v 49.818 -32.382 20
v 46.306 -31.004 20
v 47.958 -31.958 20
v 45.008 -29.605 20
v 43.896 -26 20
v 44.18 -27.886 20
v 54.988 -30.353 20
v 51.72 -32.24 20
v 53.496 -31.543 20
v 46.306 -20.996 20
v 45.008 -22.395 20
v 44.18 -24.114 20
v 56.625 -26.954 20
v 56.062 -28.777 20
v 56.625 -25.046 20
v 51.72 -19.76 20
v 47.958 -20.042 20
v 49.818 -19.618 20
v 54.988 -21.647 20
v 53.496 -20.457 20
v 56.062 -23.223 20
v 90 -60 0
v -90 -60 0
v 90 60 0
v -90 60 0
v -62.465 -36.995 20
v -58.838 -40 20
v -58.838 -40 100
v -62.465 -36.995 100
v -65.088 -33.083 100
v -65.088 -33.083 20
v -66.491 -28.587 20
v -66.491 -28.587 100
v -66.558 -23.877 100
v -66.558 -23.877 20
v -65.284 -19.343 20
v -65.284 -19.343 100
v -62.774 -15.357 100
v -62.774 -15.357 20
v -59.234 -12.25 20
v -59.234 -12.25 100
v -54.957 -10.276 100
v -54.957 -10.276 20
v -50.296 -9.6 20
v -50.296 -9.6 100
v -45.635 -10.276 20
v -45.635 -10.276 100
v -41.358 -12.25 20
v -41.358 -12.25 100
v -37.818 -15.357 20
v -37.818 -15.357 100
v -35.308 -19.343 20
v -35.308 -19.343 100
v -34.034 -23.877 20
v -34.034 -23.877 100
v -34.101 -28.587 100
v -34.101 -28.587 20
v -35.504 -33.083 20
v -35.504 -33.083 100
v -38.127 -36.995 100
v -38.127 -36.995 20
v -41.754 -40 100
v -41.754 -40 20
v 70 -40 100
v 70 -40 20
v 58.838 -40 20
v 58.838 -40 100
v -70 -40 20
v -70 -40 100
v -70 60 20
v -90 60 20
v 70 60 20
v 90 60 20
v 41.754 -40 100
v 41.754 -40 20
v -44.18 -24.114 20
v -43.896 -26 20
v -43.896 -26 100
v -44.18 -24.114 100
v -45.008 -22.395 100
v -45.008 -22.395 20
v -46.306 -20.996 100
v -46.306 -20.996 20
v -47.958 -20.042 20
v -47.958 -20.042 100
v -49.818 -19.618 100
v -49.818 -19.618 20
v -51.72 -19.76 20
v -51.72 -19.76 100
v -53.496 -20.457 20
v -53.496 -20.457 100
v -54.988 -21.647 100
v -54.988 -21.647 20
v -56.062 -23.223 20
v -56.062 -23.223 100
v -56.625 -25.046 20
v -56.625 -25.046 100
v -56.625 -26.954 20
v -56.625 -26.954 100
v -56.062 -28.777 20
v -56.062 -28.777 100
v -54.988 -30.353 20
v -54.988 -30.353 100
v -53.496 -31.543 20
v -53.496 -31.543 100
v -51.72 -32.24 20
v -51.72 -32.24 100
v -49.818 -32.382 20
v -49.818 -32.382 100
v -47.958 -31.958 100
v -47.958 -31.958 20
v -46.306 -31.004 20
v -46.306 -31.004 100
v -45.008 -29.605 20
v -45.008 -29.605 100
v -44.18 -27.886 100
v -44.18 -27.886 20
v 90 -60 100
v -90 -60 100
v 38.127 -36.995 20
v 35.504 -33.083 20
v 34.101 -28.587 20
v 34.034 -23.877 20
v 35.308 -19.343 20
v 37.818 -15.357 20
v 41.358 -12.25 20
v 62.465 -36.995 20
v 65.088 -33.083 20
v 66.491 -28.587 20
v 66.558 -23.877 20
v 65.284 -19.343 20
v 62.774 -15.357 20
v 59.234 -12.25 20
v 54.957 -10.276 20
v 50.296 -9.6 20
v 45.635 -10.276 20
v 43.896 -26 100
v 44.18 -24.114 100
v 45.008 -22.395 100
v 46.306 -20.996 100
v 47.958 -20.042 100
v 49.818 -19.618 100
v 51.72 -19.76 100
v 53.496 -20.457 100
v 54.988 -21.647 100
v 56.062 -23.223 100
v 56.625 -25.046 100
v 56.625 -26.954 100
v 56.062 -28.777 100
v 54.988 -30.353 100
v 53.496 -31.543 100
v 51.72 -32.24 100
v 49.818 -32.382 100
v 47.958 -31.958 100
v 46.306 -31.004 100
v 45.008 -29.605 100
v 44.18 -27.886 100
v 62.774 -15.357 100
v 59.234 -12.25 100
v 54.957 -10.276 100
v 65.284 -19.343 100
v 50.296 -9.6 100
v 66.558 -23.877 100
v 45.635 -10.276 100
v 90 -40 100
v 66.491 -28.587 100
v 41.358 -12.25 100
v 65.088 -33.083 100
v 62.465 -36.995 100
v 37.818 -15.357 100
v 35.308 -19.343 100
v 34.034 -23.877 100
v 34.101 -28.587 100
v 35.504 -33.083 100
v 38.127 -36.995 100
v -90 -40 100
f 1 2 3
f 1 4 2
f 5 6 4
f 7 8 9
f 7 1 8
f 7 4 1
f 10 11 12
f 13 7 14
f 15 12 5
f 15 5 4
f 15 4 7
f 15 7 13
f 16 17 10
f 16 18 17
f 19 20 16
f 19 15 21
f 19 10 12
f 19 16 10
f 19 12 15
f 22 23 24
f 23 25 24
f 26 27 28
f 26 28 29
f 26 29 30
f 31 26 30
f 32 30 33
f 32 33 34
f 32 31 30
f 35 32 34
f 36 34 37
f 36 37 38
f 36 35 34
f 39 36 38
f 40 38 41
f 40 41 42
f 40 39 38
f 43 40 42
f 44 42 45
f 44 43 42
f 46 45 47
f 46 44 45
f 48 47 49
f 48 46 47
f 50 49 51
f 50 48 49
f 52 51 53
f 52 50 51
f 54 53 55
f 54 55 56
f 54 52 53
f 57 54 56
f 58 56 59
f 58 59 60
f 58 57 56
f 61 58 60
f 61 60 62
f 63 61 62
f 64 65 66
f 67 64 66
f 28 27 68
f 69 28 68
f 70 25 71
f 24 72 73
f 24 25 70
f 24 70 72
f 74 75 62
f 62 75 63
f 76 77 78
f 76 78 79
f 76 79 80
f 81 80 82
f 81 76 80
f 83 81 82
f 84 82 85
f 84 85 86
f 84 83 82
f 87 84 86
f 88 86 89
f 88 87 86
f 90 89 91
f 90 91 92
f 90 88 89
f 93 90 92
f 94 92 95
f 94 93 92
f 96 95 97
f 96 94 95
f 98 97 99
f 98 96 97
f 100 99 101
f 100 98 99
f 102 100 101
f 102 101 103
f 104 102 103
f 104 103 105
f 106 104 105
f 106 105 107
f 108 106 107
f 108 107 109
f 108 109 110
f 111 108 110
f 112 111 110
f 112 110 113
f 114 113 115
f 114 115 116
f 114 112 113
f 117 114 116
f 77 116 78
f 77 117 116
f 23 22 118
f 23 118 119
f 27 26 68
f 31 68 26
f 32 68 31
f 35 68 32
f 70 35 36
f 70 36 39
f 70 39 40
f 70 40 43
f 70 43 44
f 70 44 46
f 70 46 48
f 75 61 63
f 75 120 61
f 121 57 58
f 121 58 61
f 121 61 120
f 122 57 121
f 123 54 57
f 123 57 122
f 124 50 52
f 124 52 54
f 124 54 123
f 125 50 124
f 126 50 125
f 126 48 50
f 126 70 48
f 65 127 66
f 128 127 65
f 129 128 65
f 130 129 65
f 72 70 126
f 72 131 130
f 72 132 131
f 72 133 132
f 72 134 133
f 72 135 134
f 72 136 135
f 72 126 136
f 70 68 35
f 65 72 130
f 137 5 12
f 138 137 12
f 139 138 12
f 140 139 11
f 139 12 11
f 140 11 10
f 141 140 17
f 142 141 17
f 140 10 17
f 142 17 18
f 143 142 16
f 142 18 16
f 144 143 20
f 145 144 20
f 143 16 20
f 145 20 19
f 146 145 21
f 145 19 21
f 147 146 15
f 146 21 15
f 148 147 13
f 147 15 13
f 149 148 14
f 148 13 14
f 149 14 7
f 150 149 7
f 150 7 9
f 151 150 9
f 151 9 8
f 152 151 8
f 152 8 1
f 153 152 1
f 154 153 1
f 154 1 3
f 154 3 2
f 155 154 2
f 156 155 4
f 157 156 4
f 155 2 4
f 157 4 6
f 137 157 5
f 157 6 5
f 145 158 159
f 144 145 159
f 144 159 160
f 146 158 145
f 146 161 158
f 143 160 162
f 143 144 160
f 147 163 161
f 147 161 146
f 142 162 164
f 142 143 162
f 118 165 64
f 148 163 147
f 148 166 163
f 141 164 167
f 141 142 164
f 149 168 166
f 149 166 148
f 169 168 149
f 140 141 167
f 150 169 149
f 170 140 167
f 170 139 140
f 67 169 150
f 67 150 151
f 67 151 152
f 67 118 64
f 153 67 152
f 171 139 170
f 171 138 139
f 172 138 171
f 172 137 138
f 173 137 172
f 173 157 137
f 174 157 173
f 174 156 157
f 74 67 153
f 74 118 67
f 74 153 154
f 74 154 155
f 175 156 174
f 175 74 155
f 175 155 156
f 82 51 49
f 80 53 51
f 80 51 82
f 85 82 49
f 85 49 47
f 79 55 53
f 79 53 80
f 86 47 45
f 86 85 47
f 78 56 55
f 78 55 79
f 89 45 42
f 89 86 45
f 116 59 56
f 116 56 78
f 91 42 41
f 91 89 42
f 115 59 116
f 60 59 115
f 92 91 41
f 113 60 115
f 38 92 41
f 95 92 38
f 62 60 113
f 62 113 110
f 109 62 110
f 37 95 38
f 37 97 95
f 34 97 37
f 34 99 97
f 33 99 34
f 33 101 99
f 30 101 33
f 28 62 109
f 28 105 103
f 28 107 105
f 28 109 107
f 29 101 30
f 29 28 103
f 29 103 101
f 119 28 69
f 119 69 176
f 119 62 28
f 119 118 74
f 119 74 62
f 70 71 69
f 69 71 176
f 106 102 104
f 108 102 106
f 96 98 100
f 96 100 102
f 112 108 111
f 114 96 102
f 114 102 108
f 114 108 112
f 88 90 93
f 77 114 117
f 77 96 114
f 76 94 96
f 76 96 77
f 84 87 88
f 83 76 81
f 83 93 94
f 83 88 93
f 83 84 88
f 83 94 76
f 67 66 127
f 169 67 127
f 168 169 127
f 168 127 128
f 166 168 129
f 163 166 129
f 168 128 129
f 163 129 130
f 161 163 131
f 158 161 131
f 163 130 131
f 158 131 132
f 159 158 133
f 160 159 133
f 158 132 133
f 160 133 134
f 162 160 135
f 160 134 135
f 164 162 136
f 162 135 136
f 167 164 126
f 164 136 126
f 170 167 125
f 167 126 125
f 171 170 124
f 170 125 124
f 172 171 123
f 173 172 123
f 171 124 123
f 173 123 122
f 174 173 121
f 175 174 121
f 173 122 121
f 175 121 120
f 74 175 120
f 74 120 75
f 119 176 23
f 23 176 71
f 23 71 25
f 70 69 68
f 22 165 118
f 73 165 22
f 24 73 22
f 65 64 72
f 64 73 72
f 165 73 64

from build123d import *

# Parameters (mm, degrees)
SKETCH1_W            = 180
SKETCH1_H            = 120
BOSS_EXTRUDE1_DEPTH  = 20
SKETCH4_W            = 180
SKETCH4_H            = 100
BOSS_EXTRUDE4_DEPTH  = 20
BOSS_EXTRUDE5_DEPTH  = 20
SKETCH6_R            = 6.4
BOSS_EXTRUDE11_DEPTH = 80


with BuildPart() as part:
    # Sketch1 → Boss-Extrude1 (new body)
    with BuildSketch(Plane.XY):
        Rectangle(SKETCH1_W, SKETCH1_H)
    extrude(amount=BOSS_EXTRUDE1_DEPTH)

    # Sketch4 → Boss-Extrude4 (add)
    with BuildSketch(Plane(origin=(0, -60, 0), x_dir=(-1, 0, 0), z_dir=(0, -1, 0))):
        with Locations((0, -50)):
            Rectangle(SKETCH4_W, SKETCH4_H)
    extrude(amount=-BOSS_EXTRUDE4_DEPTH)

    # Sketch5 → Boss-Extrude5 (add)
    with BuildSketch(Plane(origin=(90, 0, 0), x_dir=(0, 0, -1), z_dir=(1, 0, 0))):
        Polygon((-100, -40), (-20, -40), (-20, 60), align=None)
    boss_extrude5 = extrude(amount=-BOSS_EXTRUDE5_DEPTH)

    # Mirror2: Boss-Extrude5 across plane
    add(boss_extrude5.mirror(Plane(origin=(0, 0, 0), x_dir=(0, 0, 1), z_dir=(1, 0, 0))))

    # Sketch6 → Boss-Extrude11 (add)
    with BuildSketch(Plane.XY.offset(20)):
        with BuildLine():
            Line((-41.754337398, -40), (-58.837662602, -40))
            ThreePointArc((-58.837662602, -40), (-50.296, -9.6), (-41.754337398, -40))
        make_face()
        with Locations((-50.296, -26)):
            Circle(SKETCH6_R, mode=Mode.SUBTRACT)
    boss_extrude11 = extrude(amount=BOSS_EXTRUDE11_DEPTH)

    # Mirror3: Boss-Extrude11 across plane
    add(boss_extrude11.mirror(Plane(origin=(0, 0, 0), x_dir=(0, 0, 1), z_dir=(1, 0, 0))))


solid = part.part
